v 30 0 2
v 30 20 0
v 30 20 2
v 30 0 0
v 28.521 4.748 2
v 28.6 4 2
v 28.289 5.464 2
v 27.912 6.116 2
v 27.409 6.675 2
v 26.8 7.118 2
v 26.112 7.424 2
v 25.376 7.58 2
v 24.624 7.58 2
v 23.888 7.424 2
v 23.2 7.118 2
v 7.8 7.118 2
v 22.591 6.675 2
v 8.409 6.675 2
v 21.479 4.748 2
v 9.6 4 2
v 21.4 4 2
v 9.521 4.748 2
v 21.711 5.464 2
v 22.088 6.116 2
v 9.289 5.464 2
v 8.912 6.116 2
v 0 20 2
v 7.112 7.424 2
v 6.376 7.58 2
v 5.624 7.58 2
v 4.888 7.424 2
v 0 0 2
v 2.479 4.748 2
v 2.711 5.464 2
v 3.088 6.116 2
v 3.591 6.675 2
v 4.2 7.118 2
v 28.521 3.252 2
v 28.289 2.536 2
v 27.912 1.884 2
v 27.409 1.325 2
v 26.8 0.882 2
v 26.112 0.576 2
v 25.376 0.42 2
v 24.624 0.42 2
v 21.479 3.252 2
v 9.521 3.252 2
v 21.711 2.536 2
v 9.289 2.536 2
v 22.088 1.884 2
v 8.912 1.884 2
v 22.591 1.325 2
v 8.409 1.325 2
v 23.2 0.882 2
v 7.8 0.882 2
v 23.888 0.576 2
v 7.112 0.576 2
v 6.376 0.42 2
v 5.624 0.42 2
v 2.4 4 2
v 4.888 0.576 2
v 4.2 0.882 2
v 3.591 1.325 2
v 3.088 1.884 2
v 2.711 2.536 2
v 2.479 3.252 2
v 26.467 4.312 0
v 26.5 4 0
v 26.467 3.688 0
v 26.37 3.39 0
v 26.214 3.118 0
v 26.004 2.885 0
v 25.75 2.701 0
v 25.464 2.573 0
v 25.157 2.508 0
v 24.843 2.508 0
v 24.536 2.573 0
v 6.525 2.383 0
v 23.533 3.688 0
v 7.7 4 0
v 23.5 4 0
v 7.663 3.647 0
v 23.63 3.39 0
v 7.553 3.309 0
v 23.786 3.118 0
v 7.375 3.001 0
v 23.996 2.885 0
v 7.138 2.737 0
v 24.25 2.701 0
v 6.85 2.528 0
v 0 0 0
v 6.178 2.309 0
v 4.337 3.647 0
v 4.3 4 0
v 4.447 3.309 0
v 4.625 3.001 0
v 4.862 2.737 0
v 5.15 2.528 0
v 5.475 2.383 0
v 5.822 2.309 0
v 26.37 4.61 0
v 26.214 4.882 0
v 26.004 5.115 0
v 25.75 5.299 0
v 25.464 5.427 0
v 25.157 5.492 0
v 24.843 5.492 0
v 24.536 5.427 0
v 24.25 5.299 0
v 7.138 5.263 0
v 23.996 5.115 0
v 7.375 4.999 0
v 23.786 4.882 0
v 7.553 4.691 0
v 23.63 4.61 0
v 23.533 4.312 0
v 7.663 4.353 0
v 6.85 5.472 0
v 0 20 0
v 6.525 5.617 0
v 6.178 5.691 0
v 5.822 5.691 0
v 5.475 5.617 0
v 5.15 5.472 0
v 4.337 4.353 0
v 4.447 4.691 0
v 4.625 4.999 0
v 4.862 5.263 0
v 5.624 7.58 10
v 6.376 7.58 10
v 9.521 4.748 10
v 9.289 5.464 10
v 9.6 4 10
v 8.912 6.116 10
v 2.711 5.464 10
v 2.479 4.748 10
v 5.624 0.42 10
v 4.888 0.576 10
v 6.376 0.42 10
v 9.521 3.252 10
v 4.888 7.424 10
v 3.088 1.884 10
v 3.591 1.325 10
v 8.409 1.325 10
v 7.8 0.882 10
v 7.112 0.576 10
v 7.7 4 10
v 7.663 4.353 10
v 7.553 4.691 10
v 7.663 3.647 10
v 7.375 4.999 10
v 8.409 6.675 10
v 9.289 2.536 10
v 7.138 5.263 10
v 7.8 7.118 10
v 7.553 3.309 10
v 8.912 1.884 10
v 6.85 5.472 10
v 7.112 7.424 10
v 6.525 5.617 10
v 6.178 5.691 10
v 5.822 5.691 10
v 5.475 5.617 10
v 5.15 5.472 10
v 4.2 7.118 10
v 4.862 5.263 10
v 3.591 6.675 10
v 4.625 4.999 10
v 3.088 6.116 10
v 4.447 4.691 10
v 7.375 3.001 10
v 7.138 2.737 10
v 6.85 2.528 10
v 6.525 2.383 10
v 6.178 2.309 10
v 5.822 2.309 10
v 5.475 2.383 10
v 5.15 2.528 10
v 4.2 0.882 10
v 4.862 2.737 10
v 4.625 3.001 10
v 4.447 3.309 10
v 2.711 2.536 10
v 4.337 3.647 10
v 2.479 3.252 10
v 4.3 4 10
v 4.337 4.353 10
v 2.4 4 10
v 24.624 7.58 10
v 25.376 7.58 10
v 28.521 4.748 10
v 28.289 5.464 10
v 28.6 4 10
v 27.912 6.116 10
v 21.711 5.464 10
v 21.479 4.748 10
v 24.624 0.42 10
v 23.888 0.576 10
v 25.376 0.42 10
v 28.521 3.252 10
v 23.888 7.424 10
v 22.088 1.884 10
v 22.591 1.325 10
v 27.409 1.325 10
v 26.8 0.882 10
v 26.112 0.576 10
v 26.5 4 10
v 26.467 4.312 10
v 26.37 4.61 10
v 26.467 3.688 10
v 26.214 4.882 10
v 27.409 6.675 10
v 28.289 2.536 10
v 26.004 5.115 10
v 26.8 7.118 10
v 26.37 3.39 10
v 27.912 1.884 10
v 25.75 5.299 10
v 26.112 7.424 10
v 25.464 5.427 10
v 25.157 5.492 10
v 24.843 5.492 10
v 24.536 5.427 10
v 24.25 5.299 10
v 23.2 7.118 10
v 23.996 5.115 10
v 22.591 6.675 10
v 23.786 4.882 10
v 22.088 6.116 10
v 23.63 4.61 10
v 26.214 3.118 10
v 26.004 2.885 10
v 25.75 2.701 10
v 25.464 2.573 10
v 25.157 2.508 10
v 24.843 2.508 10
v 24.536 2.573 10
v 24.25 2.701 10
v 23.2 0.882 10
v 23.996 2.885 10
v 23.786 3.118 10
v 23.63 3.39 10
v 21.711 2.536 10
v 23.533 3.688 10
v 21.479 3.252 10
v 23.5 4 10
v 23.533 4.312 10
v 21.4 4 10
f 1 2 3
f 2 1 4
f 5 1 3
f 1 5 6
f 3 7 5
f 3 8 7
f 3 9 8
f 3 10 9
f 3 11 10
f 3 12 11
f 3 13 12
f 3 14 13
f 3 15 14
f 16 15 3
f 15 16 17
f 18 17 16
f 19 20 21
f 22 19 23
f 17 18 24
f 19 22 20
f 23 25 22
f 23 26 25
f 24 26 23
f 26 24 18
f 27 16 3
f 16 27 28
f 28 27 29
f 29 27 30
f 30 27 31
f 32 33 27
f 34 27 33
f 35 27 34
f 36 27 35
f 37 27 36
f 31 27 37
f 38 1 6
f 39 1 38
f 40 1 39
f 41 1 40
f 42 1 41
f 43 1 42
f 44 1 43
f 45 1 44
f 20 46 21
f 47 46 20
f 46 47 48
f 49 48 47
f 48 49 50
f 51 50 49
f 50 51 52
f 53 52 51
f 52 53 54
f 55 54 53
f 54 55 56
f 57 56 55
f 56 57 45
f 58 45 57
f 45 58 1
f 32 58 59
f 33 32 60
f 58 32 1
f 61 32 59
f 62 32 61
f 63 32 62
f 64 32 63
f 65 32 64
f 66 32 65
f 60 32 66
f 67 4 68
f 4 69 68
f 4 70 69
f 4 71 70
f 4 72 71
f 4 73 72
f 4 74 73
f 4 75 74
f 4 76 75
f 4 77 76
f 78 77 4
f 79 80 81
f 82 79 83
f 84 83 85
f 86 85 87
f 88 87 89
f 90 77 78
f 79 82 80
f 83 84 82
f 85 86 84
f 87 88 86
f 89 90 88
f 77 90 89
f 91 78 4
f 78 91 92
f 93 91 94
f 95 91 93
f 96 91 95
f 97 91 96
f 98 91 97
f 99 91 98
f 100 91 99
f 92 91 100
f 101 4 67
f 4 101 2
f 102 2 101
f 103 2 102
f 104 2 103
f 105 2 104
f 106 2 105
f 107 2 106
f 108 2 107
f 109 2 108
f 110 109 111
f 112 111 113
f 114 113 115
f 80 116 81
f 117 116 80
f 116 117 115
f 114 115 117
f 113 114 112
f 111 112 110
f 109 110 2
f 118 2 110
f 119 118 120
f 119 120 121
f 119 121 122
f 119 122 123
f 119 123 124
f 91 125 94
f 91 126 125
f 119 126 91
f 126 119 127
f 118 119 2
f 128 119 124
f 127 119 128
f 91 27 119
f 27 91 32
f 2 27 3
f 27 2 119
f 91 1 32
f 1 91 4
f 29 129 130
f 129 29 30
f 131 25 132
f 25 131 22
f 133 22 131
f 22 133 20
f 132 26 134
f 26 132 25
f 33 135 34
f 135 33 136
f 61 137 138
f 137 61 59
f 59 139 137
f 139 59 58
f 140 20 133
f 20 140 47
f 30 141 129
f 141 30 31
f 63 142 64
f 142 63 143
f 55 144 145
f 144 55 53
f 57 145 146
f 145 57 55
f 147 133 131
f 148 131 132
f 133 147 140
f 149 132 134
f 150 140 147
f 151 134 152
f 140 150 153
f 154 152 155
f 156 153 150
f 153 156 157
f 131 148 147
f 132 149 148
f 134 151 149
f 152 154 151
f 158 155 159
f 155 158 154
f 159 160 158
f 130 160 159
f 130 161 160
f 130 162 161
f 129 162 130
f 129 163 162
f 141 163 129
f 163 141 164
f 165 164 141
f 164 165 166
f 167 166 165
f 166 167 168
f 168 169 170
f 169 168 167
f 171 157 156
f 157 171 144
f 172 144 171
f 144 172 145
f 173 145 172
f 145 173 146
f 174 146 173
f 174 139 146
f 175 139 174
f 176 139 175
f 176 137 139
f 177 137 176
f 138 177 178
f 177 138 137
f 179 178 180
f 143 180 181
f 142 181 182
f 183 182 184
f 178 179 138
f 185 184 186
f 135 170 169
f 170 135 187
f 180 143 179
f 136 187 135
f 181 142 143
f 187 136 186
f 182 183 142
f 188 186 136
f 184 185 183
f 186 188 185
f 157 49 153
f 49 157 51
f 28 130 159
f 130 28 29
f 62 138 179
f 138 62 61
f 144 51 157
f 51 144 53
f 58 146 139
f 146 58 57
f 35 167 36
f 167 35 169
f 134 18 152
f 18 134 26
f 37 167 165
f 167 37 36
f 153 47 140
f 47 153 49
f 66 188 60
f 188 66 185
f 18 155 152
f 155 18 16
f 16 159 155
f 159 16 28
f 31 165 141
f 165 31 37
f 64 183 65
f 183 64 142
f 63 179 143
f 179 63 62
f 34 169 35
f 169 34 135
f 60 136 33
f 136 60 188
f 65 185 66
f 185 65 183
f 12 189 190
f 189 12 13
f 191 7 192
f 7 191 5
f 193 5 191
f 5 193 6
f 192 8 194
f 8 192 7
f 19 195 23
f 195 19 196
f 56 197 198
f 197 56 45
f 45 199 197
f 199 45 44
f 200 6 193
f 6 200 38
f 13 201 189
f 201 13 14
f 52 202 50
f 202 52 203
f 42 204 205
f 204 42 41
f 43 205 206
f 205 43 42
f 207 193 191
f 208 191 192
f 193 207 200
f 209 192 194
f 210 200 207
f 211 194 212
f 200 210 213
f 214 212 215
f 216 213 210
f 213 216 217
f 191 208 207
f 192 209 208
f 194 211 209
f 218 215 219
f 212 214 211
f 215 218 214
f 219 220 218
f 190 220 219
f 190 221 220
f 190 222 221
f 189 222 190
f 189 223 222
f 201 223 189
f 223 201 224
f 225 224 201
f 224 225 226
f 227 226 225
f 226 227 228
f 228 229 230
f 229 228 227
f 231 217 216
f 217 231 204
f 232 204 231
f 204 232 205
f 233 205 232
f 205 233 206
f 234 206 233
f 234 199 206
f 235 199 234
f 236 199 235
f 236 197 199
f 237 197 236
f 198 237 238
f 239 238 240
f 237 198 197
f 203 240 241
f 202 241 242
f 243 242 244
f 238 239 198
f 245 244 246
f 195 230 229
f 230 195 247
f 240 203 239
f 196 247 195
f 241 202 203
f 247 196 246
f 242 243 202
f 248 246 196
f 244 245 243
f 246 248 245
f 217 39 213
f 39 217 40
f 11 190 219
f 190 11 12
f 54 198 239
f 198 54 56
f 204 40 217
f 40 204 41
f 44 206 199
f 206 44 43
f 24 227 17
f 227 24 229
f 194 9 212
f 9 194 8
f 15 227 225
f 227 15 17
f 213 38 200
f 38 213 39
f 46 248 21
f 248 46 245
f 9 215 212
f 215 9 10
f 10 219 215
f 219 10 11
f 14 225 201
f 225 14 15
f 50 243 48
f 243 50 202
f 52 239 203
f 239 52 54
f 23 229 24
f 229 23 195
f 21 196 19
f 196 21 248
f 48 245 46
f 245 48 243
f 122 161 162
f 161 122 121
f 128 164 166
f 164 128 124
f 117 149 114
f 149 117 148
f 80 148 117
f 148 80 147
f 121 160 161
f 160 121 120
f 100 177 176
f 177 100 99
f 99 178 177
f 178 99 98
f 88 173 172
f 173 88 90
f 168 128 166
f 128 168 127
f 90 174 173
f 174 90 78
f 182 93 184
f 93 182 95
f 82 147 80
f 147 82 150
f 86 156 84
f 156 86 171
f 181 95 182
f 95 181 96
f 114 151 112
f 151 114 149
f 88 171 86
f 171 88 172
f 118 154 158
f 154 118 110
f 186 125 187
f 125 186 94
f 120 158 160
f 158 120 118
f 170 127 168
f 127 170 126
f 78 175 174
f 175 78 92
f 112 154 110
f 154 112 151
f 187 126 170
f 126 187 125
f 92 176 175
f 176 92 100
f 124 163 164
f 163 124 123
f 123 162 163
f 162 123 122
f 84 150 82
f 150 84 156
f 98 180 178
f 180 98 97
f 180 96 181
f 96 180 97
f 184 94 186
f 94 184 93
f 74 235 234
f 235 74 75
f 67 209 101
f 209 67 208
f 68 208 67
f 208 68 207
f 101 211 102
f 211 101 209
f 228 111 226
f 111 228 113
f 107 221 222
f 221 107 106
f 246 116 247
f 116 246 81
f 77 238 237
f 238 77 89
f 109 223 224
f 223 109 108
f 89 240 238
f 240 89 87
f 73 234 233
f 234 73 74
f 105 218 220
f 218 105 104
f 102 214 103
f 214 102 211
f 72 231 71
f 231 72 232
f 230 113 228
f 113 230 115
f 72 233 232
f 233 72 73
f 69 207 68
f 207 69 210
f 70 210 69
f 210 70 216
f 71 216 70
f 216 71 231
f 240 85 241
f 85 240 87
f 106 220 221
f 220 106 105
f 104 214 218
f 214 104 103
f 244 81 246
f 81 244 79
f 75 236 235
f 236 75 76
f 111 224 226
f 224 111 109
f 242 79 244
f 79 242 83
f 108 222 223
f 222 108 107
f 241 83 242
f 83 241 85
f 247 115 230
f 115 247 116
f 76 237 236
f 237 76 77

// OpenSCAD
// default();
// mirrored();
zstop();


module default() {
	difference() {
		union() {
			cube([30, 20, 2]);
			translate([6, 16, 2]) cylinder(r=3.6, h=2, $fn=30);
			translate([25, 16, 2]) cylinder(r=3.6, h=2, $fn=30);
		}
		translate([6, 16, -0.1]) cylinder(r=1.7, h=10, $fn=30);
		translate([25, 16, -0.1]) cylinder(r=1.5, h=10, $fn=30);
	}
}

module mirrored() {
	difference() {
		union() {
			cube([30, 20, 2]);
			translate([6, 4, 2]) cylinder(r=3.6, h=6, $fn=30);
			translate([25, 4, 2]) cylinder(r=3.6, h=6, $fn=30);
		}
		translate([6, 4, -0.1]) cylinder(r=1.7, h=10, $fn=30);
		translate([25, 4, -0.1]) cylinder(r=1.5, h=10, $fn=30);
	}
}

module zstop() {
	difference() {
		union() {
			cube([30, 20, 2]);
			translate([6, 4, 2]) cylinder(r=3.6, h=8, $fn=30);
			translate([25, 4, 2]) cylinder(r=3.6, h=8, $fn=30);
		}
		translate([6, 4, -0.1]) cylinder(r=1.7, h=20, $fn=30);
		translate([25, 4, -0.1]) cylinder(r=1.5, h=20, $fn=30);
	}
}
